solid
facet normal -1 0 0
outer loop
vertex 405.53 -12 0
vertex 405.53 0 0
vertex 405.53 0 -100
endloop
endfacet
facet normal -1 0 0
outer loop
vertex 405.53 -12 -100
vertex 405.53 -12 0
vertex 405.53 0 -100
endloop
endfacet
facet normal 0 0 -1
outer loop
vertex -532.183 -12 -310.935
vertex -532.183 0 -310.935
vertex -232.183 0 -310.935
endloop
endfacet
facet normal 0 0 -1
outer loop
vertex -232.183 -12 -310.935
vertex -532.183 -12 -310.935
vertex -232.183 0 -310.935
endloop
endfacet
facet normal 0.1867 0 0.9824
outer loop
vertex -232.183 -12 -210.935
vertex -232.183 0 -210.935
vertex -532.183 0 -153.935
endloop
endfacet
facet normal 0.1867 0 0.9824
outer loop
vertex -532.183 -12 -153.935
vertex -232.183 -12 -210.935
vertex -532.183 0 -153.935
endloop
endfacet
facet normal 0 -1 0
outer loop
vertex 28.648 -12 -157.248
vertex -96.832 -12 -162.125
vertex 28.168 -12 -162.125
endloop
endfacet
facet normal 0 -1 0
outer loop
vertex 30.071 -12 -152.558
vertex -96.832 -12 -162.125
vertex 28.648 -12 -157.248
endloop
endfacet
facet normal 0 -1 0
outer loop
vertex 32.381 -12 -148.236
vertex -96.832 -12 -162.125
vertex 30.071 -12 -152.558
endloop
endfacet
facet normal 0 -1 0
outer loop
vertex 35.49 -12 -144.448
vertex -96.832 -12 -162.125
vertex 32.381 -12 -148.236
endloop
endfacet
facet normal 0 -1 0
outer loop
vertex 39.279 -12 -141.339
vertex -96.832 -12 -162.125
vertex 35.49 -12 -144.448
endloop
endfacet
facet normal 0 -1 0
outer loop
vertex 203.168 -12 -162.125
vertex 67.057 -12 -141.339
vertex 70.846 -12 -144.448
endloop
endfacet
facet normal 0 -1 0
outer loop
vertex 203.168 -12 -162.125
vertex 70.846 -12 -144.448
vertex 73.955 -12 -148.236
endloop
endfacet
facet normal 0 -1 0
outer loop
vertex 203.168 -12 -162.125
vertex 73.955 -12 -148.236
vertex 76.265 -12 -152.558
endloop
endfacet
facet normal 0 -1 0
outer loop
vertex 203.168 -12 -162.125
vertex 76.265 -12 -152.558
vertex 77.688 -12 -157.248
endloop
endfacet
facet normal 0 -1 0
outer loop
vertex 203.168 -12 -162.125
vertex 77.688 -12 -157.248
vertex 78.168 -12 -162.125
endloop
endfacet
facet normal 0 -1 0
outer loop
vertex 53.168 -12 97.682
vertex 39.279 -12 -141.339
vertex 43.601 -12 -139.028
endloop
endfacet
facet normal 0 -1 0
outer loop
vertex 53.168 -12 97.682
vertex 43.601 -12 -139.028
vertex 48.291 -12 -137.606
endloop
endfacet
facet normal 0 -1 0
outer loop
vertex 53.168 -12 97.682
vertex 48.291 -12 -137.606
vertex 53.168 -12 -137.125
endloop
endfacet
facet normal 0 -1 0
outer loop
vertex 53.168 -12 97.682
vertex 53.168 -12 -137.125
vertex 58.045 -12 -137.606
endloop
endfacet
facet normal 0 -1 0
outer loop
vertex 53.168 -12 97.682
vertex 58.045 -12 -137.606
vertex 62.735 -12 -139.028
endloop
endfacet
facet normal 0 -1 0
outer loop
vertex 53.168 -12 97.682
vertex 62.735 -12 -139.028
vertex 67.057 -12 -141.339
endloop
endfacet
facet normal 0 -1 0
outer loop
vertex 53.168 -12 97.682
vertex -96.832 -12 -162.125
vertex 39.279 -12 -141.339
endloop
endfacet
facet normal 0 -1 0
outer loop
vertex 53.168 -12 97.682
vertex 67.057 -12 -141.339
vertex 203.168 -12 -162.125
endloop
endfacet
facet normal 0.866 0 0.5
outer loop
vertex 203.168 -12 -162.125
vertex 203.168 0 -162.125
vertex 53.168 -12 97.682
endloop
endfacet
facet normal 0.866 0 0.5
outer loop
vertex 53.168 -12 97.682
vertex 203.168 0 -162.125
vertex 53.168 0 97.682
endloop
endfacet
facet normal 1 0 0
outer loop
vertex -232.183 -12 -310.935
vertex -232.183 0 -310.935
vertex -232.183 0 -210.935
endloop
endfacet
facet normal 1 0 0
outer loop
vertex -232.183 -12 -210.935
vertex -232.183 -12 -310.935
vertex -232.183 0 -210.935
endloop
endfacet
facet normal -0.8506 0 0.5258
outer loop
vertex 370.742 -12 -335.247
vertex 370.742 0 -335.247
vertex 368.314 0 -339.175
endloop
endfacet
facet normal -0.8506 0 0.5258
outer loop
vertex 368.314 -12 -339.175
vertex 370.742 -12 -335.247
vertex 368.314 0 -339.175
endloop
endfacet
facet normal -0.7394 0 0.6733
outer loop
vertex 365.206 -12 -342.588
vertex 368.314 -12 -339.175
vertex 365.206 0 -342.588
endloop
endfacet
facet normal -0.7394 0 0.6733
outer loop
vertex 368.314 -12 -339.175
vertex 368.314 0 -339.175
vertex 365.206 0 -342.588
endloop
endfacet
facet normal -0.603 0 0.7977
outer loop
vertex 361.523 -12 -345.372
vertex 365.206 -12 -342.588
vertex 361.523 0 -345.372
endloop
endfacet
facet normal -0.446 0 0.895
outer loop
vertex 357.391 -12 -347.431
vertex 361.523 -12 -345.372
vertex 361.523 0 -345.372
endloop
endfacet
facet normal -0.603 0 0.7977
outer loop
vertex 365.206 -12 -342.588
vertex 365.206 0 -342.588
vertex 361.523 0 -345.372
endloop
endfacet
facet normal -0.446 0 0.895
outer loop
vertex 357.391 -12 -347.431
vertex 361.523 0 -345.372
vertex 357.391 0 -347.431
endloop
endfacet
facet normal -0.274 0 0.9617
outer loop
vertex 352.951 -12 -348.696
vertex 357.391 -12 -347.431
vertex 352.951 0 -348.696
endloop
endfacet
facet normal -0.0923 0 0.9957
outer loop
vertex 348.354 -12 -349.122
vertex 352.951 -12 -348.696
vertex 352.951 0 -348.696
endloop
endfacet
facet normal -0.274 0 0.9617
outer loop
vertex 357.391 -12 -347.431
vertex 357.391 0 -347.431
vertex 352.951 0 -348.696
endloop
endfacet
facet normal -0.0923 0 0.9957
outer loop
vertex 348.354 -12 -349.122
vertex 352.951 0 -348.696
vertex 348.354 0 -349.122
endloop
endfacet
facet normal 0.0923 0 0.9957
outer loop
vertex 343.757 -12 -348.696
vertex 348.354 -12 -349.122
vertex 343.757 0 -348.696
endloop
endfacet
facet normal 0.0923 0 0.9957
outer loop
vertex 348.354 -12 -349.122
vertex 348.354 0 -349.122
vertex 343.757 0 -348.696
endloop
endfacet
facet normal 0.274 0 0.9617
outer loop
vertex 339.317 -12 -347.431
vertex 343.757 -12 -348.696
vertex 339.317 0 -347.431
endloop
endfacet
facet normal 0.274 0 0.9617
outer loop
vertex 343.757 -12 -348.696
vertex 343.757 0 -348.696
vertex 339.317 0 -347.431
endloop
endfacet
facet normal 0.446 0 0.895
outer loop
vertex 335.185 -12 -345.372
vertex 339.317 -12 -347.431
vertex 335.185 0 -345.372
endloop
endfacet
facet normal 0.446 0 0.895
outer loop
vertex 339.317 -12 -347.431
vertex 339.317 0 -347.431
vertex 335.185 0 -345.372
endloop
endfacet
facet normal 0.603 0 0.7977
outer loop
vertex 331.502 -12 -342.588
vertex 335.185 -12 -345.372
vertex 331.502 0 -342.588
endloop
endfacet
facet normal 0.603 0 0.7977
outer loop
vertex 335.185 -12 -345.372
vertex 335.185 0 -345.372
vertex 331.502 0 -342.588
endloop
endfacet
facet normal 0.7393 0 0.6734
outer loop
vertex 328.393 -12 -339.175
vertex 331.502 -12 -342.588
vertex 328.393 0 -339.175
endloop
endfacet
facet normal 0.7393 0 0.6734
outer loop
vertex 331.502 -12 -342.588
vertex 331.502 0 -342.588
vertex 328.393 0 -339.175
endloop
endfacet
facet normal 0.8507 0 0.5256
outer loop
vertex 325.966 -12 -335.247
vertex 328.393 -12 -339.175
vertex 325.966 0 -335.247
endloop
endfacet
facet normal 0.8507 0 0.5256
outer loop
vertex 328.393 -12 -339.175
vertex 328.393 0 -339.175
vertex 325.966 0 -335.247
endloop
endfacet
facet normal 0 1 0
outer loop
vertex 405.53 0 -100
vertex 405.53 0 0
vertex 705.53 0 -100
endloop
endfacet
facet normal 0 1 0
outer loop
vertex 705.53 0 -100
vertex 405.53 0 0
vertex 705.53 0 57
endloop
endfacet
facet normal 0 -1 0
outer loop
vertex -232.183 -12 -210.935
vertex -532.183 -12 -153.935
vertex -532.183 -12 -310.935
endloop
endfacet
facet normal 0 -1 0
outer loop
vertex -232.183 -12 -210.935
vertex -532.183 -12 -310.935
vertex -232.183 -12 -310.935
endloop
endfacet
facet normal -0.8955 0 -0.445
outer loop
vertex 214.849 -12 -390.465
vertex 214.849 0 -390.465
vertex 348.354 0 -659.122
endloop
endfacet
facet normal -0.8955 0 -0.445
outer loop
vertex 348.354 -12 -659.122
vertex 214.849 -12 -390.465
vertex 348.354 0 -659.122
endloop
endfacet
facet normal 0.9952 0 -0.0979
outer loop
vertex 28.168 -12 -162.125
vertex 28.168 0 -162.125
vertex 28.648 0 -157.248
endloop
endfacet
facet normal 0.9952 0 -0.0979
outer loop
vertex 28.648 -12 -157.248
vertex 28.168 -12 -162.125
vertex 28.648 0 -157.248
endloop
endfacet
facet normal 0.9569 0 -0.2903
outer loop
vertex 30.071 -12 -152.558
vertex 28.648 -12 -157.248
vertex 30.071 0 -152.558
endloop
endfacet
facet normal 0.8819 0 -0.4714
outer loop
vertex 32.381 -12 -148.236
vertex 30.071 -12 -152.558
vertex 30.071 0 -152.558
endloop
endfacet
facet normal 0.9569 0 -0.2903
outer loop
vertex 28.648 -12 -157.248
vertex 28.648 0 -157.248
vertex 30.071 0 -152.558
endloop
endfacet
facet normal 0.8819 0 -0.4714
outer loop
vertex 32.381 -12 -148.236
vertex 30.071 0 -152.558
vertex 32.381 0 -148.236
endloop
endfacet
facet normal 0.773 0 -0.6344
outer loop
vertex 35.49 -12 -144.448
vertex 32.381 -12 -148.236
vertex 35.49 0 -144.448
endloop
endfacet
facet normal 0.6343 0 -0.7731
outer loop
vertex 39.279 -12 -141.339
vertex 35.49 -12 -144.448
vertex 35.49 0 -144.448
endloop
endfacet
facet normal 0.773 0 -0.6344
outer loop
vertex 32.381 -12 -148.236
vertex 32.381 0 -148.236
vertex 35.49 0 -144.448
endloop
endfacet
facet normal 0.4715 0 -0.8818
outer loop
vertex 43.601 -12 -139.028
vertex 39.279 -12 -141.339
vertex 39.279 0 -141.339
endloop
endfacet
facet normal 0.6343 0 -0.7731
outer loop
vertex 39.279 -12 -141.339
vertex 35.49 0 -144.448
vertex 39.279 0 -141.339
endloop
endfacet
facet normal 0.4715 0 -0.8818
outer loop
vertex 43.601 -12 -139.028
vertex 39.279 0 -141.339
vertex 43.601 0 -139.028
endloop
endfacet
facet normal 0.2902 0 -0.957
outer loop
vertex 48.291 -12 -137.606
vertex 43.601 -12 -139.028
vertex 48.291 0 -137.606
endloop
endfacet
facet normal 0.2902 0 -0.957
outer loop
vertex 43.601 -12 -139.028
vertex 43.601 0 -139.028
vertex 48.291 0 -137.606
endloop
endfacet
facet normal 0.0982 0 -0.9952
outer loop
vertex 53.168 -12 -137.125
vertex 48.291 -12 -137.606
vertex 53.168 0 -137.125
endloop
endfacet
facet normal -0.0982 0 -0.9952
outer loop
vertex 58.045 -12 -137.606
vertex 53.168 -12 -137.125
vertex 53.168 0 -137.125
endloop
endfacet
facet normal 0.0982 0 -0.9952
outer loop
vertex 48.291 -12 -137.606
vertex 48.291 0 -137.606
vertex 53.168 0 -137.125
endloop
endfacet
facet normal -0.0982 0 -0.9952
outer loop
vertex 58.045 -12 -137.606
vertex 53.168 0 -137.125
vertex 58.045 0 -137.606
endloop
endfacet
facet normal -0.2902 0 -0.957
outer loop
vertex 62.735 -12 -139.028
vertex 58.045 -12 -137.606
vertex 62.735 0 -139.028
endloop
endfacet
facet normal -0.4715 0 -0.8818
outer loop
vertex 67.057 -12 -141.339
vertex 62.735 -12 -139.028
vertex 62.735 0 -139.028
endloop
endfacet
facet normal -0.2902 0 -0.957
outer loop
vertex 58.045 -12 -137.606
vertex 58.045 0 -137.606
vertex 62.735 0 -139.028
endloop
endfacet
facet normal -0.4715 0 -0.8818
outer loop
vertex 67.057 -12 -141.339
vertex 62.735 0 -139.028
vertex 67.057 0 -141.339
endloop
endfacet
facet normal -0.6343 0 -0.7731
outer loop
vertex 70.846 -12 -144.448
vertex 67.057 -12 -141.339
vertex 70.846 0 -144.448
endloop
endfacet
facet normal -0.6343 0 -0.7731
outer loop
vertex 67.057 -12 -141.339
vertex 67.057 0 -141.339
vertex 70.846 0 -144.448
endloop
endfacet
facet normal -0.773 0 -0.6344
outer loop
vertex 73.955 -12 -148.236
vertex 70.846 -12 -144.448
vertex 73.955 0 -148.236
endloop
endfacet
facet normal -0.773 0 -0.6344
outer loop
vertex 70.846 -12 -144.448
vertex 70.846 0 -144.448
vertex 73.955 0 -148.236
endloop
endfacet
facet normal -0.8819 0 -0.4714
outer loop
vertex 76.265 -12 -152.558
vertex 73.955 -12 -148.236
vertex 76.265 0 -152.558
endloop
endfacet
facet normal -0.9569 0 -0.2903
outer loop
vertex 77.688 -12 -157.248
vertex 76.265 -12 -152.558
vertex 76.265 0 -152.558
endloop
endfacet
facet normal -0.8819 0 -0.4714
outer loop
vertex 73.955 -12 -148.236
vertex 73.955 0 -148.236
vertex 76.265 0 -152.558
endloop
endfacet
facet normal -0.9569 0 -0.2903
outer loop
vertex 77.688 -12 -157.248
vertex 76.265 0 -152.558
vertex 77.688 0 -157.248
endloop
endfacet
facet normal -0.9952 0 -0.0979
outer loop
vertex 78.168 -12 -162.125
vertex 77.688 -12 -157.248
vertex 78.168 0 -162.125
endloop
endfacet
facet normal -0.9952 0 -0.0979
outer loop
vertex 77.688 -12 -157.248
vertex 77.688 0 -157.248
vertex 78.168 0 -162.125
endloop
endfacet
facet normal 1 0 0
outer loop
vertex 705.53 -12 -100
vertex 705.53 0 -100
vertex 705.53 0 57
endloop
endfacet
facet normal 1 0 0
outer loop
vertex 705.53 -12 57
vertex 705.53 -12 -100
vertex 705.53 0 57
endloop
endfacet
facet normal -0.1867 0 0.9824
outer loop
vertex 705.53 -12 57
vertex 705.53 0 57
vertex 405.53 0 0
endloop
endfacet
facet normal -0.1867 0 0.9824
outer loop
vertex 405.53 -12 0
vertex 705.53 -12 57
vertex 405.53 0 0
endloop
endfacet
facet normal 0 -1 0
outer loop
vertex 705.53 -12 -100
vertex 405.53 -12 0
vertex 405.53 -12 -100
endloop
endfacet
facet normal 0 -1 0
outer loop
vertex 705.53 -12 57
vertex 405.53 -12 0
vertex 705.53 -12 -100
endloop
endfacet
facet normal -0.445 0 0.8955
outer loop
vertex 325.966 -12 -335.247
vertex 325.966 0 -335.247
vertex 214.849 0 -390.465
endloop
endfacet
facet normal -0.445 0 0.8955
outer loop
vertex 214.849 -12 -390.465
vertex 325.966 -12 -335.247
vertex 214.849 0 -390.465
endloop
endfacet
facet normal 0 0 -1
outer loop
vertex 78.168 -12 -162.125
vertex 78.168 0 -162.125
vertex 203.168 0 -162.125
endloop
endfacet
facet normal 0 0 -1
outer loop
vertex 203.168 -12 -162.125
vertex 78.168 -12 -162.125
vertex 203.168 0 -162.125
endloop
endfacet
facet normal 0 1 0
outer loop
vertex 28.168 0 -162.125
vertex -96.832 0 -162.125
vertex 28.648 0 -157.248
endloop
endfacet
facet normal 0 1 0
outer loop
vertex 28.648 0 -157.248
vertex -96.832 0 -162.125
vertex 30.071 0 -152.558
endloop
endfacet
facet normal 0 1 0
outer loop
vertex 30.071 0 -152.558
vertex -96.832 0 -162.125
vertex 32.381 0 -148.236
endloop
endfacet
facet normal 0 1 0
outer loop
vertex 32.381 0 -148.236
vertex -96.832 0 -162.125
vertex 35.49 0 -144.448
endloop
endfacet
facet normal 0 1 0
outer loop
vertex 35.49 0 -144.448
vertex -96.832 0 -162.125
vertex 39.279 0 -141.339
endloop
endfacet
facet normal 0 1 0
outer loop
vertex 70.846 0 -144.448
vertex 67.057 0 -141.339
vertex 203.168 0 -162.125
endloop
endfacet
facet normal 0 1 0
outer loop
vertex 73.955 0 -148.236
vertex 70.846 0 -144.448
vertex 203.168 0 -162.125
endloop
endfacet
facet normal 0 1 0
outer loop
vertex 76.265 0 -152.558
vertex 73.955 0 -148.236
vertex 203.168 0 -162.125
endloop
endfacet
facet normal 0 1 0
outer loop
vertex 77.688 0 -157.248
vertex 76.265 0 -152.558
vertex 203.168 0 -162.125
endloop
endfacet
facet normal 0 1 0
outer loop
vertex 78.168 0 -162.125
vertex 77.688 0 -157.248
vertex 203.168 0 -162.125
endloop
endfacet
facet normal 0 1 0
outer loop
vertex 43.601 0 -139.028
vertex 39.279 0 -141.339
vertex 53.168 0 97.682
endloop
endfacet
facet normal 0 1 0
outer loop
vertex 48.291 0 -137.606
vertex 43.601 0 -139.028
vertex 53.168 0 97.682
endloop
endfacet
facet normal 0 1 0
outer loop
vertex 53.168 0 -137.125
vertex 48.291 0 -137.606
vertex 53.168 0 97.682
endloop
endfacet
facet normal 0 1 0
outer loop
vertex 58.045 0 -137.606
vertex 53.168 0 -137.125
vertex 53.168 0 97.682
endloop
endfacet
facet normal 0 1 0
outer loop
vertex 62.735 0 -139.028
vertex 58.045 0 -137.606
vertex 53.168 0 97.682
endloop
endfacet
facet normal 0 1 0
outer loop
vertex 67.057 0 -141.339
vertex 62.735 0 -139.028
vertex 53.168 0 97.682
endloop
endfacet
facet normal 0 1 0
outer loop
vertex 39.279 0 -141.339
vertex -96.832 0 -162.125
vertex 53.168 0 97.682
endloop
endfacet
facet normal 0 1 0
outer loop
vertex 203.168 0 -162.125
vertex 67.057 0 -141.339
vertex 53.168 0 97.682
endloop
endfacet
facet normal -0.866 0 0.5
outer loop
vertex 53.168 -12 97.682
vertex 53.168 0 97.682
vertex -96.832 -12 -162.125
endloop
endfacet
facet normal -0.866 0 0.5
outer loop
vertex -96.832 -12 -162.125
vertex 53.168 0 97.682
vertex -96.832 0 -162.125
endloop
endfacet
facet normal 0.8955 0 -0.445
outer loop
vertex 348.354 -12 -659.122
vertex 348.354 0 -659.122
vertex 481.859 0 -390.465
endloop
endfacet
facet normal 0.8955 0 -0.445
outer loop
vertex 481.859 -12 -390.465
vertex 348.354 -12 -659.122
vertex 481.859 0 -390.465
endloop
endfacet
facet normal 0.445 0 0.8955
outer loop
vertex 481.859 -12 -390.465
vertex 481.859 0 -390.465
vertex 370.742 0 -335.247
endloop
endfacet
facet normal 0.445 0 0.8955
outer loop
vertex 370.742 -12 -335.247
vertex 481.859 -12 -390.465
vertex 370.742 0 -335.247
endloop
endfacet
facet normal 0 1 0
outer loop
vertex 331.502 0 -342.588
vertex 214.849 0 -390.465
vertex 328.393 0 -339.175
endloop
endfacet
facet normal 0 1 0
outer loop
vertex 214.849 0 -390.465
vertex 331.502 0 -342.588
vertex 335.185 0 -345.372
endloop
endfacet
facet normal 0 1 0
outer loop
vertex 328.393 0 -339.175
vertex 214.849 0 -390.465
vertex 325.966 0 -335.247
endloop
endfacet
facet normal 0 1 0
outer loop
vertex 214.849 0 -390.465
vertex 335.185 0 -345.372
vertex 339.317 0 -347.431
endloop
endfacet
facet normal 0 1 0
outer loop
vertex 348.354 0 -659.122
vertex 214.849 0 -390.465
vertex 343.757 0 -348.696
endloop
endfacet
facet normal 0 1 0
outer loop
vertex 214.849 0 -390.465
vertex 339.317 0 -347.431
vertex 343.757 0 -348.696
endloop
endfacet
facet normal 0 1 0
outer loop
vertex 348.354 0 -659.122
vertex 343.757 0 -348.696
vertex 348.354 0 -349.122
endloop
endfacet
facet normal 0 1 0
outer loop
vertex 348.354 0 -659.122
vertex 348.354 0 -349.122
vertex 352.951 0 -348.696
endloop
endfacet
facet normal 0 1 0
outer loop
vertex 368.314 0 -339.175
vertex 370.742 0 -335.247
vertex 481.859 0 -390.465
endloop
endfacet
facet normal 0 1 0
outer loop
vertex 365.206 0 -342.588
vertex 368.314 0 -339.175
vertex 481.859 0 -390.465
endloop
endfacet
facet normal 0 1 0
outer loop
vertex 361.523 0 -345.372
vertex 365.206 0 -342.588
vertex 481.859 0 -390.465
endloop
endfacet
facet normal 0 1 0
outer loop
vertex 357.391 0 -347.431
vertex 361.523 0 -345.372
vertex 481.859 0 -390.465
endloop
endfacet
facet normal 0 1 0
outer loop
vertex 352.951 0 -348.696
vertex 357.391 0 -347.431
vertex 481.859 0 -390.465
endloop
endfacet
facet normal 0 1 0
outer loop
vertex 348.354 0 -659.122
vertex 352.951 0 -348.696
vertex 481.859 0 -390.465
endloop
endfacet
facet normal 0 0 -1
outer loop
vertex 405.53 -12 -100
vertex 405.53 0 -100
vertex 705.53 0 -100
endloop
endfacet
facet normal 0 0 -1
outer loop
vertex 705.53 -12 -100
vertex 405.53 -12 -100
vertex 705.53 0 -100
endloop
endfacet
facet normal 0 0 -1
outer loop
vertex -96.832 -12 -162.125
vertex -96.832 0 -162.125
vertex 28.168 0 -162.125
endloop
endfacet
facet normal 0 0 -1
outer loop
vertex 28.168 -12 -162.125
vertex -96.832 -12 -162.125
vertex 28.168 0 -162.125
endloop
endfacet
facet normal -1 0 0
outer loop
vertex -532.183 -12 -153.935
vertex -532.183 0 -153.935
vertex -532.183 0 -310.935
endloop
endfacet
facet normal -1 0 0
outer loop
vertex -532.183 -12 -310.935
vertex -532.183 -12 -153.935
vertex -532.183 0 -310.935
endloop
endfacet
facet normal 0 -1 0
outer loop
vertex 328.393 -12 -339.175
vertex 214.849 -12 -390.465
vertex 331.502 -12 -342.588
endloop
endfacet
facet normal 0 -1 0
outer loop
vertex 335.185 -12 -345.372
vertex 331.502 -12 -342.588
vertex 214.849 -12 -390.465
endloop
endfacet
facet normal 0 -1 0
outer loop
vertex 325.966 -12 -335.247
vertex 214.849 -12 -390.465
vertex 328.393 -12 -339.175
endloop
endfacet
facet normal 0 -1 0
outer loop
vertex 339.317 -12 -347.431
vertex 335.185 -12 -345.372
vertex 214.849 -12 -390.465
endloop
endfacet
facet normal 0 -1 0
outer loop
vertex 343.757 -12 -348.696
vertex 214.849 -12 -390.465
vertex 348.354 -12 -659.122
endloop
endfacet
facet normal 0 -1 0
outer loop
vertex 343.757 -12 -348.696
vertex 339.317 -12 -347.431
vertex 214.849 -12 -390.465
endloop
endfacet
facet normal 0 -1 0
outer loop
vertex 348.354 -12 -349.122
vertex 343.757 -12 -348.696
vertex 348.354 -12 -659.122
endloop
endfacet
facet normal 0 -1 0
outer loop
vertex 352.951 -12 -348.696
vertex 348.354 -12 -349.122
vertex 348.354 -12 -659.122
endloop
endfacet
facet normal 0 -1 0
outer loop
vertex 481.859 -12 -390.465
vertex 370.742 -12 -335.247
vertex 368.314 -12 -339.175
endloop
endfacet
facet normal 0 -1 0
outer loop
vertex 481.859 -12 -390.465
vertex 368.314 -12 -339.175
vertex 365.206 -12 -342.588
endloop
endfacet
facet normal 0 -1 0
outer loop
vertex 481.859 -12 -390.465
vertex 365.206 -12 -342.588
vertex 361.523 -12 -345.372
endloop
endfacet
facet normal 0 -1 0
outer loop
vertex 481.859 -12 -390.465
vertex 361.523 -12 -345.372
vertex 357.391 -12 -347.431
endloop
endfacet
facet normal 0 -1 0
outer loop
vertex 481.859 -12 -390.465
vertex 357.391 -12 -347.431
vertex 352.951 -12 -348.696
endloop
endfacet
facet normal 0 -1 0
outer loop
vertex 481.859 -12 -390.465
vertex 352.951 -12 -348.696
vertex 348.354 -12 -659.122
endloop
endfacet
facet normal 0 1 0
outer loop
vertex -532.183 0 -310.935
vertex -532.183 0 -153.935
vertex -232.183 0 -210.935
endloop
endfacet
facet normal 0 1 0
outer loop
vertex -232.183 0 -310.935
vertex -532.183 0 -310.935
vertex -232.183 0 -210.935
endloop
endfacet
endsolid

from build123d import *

# Parameters (mm, degrees)
F1_DEPTH = 12


with BuildPart() as f1:
    # F0 (on Front) → F1 (new body)
    with BuildSketch(Plane.XZ):
        with BuildLine():
            Line((214.8489536166, -390.4653333906), (348.3538925648, -659.1220498085))
            Line((348.3538925648, -659.1220498085), (481.8588315129, -390.4653333906))
            Line((481.8588315129, -390.4653333906), (370.7419522663, -335.2474613875))
            ThreePointArc((370.7419522663, -335.2474613875), (348.3538925648, -349.1220498085), (325.9658328633, -335.2474613875))
            Line((325.9658328633, -335.2474613875), (214.8489536166, -390.4653333906))
        make_face()
    extrude(amount=F1_DEPTH)


with BuildPart() as f1b:
    # F0 (on Front) → F1, piece 2 (new body)
    with BuildSketch(Plane.XZ):
        with BuildLine():
            ThreePointArc((28.1680982371, -162.1252919122), (53.1680982371, -137.1252919122), (78.1680982371, -162.1252919122))
            Line((78.1680982371, -162.1252919122), (203.1680982371, -162.1252919122))
            Line((203.1680982371, -162.1252919122), (53.1680982371, 97.6823292231))
            Line((53.1680982371, 97.6823292231), (-96.8319017629, -162.1252919122))
            Line((-96.8319017629, -162.1252919122), (28.1680982371, -162.1252919122))
        make_face()
    extrude(amount=F1_DEPTH)


with BuildPart() as f1c:
    # F0 (on Front) → F1, piece 3 (new body)
    with BuildSketch(Plane.XZ):
        Polygon((705.5297672749, 57), (405.5297672749, 0), (405.5297672749, -100), (705.5297672749, -100), align=None)
    extrude(amount=F1_DEPTH)


with BuildPart() as f1d:
    # F0 (on Front) → F1, piece 4 (new body)
    with BuildSketch(Plane.XZ):
        Polygon((-532.1827530861, -153.9349433431), (-532.1827530861, -310.9349433431), (-232.1827530861, -310.9349433431), (-232.1827530861, -210.9349433431), align=None)
    extrude(amount=F1_DEPTH)


solid = Compound([f1.part, f1b.part, f1c.part, f1d.part])
